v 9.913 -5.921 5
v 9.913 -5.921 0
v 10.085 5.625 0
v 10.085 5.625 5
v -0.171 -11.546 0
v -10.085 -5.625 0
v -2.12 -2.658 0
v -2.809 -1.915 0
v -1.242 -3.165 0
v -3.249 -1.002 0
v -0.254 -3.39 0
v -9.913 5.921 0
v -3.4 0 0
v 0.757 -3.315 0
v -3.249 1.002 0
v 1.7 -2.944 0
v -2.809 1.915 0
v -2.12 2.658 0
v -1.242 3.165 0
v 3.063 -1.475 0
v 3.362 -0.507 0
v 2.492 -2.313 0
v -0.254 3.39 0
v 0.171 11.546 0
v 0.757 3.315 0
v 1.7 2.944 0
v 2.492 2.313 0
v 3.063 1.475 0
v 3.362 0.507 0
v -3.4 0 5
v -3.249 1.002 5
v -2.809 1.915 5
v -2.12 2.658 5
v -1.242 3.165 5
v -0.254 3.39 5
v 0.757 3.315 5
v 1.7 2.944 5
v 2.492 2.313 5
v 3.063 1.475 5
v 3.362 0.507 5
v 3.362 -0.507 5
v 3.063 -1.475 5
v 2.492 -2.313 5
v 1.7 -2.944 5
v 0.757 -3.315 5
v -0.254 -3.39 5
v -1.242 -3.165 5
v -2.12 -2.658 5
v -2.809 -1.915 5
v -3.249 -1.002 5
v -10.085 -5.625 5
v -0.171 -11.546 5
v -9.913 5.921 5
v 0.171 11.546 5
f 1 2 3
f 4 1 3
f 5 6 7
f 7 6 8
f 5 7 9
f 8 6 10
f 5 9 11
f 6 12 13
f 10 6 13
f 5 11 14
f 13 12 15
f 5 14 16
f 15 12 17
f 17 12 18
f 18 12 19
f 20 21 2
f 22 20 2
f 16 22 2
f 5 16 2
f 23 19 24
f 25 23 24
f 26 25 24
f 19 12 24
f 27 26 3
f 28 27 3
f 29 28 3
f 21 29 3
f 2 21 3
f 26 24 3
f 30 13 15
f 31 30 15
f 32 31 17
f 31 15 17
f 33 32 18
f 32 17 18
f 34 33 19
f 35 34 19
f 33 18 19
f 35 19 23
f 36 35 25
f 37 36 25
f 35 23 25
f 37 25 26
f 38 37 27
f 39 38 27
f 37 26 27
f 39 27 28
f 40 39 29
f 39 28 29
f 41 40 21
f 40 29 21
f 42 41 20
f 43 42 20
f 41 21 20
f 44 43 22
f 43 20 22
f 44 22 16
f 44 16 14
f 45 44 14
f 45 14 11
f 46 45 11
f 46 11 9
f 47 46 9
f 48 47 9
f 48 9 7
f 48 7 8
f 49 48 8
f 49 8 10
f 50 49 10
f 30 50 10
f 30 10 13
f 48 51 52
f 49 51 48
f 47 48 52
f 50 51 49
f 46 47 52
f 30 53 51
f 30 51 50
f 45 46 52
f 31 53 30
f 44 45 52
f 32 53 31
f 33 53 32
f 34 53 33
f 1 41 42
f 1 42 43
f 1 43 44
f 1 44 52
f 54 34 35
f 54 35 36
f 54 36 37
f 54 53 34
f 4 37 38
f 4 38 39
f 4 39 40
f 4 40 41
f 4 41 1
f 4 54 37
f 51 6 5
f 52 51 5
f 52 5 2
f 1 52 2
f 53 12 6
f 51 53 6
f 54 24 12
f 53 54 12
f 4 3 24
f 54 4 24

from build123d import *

# Parameters (mm, degrees)
BOSS_EXTRUDE1_DEPTH   = 5
M8_TAPPED_HOLE1_D     = 6.8
M8_TAPPED_HOLE1_DEPTH = 19.75
M8_TAPPED_HOLE1_TIP   = 2.042926105


with BuildPart() as part:
    # Sketch1 → Boss-Extrude1 (new body)
    with BuildSketch(Plane.XY):
        Polygon((9.913260994, -5.921198341), (10.084538681, 5.624536685), (0.171277687, 11.545735026), (-9.913260994, 5.921198341), (-10.084538681, -5.624536685), (-0.171277687, -11.545735026), align=None)
    extrude(amount=BOSS_EXTRUDE1_DEPTH)

    # M8 Tapped Hole1
    with Locations(Plane.XY.offset(5)):
        with Locations((0, 0)):
            Hole(M8_TAPPED_HOLE1_D / 2, depth=M8_TAPPED_HOLE1_DEPTH)
            with Locations((0, 0, -(M8_TAPPED_HOLE1_DEPTH + M8_TAPPED_HOLE1_TIP / 2))):  # 118° drill point
                Cone(0, M8_TAPPED_HOLE1_D / 2, M8_TAPPED_HOLE1_TIP, mode=Mode.SUBTRACT)


solid = part.part
